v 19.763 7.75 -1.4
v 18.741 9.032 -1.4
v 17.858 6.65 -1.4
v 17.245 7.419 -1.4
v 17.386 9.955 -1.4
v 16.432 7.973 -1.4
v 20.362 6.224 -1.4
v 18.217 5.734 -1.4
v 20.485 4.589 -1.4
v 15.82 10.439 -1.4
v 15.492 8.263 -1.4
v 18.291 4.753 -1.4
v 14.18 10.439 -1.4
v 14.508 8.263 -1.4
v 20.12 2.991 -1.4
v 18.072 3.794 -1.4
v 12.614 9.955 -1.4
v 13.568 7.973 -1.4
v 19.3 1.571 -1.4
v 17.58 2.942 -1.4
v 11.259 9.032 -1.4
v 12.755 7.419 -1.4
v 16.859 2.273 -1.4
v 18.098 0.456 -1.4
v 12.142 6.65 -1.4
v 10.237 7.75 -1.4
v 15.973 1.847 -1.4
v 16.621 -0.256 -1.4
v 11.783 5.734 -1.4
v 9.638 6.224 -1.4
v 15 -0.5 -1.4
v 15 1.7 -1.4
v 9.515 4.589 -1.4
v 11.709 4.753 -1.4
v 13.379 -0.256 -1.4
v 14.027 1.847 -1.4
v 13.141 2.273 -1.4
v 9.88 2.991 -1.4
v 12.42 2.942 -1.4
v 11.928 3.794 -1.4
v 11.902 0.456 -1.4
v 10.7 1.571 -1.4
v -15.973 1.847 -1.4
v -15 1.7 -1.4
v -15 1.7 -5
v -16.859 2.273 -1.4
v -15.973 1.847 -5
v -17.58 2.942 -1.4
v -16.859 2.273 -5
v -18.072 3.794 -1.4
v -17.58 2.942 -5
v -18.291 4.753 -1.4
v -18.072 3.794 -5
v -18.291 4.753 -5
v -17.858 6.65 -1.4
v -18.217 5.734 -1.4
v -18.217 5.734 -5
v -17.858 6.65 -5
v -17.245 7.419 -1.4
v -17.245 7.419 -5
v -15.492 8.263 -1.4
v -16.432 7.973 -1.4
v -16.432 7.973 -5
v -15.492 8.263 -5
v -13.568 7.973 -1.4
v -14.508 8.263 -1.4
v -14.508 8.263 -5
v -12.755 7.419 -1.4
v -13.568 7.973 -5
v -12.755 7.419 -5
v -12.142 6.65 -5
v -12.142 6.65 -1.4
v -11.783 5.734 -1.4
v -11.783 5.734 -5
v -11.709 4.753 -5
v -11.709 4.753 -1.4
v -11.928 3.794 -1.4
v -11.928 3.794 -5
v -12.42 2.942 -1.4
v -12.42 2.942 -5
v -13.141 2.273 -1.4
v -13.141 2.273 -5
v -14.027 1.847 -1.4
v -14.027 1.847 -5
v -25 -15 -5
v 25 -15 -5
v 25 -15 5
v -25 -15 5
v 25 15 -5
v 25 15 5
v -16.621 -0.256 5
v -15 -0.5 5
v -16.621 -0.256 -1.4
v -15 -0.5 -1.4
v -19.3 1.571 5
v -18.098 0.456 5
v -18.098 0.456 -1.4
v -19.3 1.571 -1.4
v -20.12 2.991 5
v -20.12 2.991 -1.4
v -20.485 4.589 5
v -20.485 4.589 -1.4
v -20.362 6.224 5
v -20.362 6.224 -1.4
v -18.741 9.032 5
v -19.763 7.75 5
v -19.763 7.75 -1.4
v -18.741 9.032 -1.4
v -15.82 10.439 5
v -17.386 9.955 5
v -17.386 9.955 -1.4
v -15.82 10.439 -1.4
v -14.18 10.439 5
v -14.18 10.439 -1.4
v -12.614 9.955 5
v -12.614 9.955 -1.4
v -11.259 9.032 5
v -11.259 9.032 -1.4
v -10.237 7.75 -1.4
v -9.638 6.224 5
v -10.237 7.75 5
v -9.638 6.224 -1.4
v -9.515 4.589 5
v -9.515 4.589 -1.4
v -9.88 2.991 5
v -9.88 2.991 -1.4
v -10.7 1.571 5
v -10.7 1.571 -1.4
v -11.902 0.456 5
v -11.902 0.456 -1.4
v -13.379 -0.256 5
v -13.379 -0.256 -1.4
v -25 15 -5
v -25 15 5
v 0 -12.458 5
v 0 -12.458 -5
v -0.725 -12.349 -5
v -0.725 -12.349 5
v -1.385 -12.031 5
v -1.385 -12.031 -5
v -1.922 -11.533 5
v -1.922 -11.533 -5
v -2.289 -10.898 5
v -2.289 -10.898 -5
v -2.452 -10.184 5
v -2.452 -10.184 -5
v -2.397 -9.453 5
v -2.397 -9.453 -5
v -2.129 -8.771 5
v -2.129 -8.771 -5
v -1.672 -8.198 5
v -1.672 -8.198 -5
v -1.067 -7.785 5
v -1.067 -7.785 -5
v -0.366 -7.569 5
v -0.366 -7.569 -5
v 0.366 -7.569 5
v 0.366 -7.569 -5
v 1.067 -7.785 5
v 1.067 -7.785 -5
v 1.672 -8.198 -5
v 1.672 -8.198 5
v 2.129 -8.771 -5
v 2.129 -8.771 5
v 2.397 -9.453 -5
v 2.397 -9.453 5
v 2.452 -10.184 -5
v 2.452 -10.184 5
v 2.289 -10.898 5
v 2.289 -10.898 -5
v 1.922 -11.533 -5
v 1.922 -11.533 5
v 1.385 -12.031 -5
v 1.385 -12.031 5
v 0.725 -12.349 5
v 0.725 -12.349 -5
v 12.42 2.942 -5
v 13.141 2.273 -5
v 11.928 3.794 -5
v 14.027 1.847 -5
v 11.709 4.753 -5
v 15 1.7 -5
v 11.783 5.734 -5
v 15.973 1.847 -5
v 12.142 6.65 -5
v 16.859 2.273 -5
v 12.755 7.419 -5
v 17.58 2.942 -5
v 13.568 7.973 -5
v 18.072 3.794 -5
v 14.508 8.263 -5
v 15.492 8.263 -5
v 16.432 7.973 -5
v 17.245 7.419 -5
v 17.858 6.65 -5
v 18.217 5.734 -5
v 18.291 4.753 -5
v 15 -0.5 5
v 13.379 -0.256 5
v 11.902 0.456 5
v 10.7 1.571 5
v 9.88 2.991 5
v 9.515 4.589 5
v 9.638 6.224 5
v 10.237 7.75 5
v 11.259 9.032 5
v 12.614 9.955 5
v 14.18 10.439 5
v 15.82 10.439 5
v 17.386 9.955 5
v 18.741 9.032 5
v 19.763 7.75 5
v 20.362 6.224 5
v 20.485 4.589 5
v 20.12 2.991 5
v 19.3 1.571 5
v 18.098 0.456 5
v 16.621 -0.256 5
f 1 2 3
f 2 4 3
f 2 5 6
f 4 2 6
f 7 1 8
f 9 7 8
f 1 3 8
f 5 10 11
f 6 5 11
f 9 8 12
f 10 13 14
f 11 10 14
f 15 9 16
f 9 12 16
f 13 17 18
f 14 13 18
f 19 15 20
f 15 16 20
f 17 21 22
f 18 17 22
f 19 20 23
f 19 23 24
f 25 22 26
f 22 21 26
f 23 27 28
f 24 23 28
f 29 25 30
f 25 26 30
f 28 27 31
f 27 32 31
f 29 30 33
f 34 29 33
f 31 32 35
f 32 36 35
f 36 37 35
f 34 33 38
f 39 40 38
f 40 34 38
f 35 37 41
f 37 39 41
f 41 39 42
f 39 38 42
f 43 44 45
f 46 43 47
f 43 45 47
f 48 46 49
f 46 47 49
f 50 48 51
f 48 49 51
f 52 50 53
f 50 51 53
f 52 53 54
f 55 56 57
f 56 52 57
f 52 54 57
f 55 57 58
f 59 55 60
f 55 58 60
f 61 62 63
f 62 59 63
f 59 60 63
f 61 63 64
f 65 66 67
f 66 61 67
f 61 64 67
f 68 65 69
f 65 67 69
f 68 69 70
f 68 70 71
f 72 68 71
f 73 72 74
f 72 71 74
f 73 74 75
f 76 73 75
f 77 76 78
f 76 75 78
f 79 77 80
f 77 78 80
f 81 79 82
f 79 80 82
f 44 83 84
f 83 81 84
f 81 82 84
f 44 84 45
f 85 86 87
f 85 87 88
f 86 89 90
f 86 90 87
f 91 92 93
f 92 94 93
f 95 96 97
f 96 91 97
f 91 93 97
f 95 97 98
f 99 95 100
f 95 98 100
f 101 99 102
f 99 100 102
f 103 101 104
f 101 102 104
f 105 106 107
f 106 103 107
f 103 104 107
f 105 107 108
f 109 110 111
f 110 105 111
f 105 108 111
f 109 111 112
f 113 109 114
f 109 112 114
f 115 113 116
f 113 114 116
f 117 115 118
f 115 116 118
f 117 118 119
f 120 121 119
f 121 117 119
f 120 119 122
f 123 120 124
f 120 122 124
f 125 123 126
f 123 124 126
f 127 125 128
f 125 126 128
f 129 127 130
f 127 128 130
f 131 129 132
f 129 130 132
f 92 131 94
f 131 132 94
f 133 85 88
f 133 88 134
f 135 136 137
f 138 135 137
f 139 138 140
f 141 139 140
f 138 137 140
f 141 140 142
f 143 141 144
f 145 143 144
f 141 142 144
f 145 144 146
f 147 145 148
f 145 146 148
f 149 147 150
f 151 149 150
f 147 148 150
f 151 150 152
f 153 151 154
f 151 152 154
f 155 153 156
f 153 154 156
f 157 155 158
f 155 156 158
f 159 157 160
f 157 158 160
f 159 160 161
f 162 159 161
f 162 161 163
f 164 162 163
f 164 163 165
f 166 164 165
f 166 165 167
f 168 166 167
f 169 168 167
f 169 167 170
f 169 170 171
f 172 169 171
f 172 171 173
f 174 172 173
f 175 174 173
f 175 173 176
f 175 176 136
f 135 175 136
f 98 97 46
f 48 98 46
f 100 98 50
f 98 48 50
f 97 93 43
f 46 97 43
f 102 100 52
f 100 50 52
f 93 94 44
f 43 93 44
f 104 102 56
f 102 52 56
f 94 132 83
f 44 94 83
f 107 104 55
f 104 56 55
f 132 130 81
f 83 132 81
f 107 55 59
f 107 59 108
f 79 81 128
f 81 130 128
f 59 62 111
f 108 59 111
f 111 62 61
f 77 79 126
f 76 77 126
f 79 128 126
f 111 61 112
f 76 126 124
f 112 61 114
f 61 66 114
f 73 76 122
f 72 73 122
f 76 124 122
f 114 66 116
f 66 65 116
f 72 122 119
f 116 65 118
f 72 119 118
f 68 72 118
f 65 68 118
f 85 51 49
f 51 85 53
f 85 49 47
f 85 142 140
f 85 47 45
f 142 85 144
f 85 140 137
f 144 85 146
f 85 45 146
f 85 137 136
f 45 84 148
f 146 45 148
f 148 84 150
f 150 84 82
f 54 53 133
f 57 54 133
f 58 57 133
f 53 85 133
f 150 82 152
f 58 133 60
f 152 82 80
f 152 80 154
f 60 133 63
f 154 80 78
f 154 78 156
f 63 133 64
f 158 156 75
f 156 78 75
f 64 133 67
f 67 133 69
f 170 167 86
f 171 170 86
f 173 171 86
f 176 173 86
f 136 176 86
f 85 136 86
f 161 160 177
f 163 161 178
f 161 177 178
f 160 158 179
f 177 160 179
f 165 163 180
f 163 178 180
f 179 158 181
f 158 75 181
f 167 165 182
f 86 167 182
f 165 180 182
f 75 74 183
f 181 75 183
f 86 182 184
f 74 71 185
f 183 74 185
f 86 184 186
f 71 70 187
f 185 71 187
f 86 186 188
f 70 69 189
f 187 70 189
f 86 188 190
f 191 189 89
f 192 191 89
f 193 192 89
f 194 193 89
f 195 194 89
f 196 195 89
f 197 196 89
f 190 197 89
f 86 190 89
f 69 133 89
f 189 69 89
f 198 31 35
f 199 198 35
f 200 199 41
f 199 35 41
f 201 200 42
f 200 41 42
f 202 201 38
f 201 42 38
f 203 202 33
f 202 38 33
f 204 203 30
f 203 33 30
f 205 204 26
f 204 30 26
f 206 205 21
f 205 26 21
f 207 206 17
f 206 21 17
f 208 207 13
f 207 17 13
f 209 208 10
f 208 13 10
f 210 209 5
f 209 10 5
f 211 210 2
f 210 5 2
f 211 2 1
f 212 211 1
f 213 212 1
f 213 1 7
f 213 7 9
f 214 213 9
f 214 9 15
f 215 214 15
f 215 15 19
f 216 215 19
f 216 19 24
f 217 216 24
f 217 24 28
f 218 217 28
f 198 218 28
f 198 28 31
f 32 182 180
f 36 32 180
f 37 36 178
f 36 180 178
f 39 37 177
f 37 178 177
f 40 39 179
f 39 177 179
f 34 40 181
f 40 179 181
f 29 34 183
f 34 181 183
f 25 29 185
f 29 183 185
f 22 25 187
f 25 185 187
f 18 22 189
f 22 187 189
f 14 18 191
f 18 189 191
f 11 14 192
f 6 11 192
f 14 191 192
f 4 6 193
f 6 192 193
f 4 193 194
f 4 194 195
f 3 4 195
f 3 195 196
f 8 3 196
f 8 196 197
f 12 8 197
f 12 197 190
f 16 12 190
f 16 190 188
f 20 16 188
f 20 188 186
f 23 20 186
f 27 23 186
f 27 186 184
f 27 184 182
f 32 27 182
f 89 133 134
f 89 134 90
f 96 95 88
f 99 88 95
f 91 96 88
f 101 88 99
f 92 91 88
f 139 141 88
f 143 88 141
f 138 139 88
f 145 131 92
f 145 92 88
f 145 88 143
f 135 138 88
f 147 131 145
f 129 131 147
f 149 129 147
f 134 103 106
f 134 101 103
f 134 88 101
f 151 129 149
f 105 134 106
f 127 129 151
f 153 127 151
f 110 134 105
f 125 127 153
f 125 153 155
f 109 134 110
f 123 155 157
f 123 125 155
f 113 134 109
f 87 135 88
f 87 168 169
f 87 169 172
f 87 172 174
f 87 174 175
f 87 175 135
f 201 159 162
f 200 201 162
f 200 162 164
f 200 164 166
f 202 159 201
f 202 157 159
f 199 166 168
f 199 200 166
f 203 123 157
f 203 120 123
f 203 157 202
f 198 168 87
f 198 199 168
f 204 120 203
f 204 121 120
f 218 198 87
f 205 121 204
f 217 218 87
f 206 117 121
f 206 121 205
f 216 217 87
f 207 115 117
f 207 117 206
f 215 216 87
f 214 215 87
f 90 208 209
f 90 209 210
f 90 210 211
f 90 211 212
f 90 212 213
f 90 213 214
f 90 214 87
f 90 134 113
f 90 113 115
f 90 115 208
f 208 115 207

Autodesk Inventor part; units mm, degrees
ref_plane "YZ Plane" through (0, 0, 0) normal (1, 0, 0) x (0, 1, 0)
ref_plane "XZ Plane" through (0, 0, 0) normal (0, 1, 0) x (-1, 0, 0)
ref_plane "XY Plane" through (0, 0, 0) normal (0, 0, 1) x (1, 0, 0)
sketch "Skizze1" plane through (0, 0, 0) normal (0, 0, 1) x (1, 0, 0)
  line L0 (-25, 15) -> (25, 15)
  line L1 (25, 15) -> (25, -15)
  line L2 (25, -15) -> (-25, -15)
  line L3 (-25, -15) -> (-25, 15)
  line L4 (-25, 15) -> (25, -15) construction
  line L5 (25, 15) -> (-25, -15) construction
  point P0 (0, 0)
  dimension "d0" = 50
  dimension "d1" = 30
extrude "Extrusion1" add sketch "Skizze1" along normal mid plane 10
sketch "Skizze3" plane through (0, 0, 5) normal (0, 0, 1) x (1, 0, 0)
  line L0 (-35, 0) -> (35, 0) projected
  line L1 (25, 15) -> (-25, 15) projected
  line L2 (0, -21) -> (0, 21) projected
  line L3 (0, 21) -> (0, -21) projected
  point P0 (0, 0)
  point P1 (0, -10)
  point P2 (15, 5)
  dimension "d6" = 25
  dimension "d16" = 10
  dimension "d31" = 15
hole "Bohrung1" at (0, -10, 5) direction (0, 0, -1) diameter 4.917 end through all thread size "M6x1" class "6H" standard "ISO Metric profile"
hole "Bohrung2" at (15, 5, 5) direction (0, 0, -1) diameter 6.6 end through all counterbore diameter 11 counterbore depth 6.4 clearance for "Sechskantkopfschraube DIN EN 24017" size "M6" standard "DIN"
mirror "Spiegeln1" about plane through (0, 0, 0) normal (1, 0, 0) of "Bohrung2"
equation "\"d0\" = Länge_Vertikalbegrenzung"
equation "\"d1\" = Breite_Vertikalbegrenzung"
equation "\"d2\" = Tiefe_Vertikalbegrenzung"
equation "\"d6\" = Abstand_Bohrung_Madenschraube"
equation "\"d16\" = Abstand_Bohrungen_y"
equation "\"d31\" = Abstand_Bohrungen_x"
equation "\"Länge_Vertikalbegrenzung\" = 50"
equation "\"Breite_Vertikalbegrenzung\" = 30"
equation "\"Tiefe_Vertikalbegrenzung\" = 10"
equation "\"Abstand_Bohrung_Madenschraube\" = 25"
equation "\"Abstand_Bohrungen_x\" = 15"
equation "\"Abstand_Bohrungen_y\" = 10"
properties part number "JH_Positionierungseinheit_Vertikalbegrenzung_int"
